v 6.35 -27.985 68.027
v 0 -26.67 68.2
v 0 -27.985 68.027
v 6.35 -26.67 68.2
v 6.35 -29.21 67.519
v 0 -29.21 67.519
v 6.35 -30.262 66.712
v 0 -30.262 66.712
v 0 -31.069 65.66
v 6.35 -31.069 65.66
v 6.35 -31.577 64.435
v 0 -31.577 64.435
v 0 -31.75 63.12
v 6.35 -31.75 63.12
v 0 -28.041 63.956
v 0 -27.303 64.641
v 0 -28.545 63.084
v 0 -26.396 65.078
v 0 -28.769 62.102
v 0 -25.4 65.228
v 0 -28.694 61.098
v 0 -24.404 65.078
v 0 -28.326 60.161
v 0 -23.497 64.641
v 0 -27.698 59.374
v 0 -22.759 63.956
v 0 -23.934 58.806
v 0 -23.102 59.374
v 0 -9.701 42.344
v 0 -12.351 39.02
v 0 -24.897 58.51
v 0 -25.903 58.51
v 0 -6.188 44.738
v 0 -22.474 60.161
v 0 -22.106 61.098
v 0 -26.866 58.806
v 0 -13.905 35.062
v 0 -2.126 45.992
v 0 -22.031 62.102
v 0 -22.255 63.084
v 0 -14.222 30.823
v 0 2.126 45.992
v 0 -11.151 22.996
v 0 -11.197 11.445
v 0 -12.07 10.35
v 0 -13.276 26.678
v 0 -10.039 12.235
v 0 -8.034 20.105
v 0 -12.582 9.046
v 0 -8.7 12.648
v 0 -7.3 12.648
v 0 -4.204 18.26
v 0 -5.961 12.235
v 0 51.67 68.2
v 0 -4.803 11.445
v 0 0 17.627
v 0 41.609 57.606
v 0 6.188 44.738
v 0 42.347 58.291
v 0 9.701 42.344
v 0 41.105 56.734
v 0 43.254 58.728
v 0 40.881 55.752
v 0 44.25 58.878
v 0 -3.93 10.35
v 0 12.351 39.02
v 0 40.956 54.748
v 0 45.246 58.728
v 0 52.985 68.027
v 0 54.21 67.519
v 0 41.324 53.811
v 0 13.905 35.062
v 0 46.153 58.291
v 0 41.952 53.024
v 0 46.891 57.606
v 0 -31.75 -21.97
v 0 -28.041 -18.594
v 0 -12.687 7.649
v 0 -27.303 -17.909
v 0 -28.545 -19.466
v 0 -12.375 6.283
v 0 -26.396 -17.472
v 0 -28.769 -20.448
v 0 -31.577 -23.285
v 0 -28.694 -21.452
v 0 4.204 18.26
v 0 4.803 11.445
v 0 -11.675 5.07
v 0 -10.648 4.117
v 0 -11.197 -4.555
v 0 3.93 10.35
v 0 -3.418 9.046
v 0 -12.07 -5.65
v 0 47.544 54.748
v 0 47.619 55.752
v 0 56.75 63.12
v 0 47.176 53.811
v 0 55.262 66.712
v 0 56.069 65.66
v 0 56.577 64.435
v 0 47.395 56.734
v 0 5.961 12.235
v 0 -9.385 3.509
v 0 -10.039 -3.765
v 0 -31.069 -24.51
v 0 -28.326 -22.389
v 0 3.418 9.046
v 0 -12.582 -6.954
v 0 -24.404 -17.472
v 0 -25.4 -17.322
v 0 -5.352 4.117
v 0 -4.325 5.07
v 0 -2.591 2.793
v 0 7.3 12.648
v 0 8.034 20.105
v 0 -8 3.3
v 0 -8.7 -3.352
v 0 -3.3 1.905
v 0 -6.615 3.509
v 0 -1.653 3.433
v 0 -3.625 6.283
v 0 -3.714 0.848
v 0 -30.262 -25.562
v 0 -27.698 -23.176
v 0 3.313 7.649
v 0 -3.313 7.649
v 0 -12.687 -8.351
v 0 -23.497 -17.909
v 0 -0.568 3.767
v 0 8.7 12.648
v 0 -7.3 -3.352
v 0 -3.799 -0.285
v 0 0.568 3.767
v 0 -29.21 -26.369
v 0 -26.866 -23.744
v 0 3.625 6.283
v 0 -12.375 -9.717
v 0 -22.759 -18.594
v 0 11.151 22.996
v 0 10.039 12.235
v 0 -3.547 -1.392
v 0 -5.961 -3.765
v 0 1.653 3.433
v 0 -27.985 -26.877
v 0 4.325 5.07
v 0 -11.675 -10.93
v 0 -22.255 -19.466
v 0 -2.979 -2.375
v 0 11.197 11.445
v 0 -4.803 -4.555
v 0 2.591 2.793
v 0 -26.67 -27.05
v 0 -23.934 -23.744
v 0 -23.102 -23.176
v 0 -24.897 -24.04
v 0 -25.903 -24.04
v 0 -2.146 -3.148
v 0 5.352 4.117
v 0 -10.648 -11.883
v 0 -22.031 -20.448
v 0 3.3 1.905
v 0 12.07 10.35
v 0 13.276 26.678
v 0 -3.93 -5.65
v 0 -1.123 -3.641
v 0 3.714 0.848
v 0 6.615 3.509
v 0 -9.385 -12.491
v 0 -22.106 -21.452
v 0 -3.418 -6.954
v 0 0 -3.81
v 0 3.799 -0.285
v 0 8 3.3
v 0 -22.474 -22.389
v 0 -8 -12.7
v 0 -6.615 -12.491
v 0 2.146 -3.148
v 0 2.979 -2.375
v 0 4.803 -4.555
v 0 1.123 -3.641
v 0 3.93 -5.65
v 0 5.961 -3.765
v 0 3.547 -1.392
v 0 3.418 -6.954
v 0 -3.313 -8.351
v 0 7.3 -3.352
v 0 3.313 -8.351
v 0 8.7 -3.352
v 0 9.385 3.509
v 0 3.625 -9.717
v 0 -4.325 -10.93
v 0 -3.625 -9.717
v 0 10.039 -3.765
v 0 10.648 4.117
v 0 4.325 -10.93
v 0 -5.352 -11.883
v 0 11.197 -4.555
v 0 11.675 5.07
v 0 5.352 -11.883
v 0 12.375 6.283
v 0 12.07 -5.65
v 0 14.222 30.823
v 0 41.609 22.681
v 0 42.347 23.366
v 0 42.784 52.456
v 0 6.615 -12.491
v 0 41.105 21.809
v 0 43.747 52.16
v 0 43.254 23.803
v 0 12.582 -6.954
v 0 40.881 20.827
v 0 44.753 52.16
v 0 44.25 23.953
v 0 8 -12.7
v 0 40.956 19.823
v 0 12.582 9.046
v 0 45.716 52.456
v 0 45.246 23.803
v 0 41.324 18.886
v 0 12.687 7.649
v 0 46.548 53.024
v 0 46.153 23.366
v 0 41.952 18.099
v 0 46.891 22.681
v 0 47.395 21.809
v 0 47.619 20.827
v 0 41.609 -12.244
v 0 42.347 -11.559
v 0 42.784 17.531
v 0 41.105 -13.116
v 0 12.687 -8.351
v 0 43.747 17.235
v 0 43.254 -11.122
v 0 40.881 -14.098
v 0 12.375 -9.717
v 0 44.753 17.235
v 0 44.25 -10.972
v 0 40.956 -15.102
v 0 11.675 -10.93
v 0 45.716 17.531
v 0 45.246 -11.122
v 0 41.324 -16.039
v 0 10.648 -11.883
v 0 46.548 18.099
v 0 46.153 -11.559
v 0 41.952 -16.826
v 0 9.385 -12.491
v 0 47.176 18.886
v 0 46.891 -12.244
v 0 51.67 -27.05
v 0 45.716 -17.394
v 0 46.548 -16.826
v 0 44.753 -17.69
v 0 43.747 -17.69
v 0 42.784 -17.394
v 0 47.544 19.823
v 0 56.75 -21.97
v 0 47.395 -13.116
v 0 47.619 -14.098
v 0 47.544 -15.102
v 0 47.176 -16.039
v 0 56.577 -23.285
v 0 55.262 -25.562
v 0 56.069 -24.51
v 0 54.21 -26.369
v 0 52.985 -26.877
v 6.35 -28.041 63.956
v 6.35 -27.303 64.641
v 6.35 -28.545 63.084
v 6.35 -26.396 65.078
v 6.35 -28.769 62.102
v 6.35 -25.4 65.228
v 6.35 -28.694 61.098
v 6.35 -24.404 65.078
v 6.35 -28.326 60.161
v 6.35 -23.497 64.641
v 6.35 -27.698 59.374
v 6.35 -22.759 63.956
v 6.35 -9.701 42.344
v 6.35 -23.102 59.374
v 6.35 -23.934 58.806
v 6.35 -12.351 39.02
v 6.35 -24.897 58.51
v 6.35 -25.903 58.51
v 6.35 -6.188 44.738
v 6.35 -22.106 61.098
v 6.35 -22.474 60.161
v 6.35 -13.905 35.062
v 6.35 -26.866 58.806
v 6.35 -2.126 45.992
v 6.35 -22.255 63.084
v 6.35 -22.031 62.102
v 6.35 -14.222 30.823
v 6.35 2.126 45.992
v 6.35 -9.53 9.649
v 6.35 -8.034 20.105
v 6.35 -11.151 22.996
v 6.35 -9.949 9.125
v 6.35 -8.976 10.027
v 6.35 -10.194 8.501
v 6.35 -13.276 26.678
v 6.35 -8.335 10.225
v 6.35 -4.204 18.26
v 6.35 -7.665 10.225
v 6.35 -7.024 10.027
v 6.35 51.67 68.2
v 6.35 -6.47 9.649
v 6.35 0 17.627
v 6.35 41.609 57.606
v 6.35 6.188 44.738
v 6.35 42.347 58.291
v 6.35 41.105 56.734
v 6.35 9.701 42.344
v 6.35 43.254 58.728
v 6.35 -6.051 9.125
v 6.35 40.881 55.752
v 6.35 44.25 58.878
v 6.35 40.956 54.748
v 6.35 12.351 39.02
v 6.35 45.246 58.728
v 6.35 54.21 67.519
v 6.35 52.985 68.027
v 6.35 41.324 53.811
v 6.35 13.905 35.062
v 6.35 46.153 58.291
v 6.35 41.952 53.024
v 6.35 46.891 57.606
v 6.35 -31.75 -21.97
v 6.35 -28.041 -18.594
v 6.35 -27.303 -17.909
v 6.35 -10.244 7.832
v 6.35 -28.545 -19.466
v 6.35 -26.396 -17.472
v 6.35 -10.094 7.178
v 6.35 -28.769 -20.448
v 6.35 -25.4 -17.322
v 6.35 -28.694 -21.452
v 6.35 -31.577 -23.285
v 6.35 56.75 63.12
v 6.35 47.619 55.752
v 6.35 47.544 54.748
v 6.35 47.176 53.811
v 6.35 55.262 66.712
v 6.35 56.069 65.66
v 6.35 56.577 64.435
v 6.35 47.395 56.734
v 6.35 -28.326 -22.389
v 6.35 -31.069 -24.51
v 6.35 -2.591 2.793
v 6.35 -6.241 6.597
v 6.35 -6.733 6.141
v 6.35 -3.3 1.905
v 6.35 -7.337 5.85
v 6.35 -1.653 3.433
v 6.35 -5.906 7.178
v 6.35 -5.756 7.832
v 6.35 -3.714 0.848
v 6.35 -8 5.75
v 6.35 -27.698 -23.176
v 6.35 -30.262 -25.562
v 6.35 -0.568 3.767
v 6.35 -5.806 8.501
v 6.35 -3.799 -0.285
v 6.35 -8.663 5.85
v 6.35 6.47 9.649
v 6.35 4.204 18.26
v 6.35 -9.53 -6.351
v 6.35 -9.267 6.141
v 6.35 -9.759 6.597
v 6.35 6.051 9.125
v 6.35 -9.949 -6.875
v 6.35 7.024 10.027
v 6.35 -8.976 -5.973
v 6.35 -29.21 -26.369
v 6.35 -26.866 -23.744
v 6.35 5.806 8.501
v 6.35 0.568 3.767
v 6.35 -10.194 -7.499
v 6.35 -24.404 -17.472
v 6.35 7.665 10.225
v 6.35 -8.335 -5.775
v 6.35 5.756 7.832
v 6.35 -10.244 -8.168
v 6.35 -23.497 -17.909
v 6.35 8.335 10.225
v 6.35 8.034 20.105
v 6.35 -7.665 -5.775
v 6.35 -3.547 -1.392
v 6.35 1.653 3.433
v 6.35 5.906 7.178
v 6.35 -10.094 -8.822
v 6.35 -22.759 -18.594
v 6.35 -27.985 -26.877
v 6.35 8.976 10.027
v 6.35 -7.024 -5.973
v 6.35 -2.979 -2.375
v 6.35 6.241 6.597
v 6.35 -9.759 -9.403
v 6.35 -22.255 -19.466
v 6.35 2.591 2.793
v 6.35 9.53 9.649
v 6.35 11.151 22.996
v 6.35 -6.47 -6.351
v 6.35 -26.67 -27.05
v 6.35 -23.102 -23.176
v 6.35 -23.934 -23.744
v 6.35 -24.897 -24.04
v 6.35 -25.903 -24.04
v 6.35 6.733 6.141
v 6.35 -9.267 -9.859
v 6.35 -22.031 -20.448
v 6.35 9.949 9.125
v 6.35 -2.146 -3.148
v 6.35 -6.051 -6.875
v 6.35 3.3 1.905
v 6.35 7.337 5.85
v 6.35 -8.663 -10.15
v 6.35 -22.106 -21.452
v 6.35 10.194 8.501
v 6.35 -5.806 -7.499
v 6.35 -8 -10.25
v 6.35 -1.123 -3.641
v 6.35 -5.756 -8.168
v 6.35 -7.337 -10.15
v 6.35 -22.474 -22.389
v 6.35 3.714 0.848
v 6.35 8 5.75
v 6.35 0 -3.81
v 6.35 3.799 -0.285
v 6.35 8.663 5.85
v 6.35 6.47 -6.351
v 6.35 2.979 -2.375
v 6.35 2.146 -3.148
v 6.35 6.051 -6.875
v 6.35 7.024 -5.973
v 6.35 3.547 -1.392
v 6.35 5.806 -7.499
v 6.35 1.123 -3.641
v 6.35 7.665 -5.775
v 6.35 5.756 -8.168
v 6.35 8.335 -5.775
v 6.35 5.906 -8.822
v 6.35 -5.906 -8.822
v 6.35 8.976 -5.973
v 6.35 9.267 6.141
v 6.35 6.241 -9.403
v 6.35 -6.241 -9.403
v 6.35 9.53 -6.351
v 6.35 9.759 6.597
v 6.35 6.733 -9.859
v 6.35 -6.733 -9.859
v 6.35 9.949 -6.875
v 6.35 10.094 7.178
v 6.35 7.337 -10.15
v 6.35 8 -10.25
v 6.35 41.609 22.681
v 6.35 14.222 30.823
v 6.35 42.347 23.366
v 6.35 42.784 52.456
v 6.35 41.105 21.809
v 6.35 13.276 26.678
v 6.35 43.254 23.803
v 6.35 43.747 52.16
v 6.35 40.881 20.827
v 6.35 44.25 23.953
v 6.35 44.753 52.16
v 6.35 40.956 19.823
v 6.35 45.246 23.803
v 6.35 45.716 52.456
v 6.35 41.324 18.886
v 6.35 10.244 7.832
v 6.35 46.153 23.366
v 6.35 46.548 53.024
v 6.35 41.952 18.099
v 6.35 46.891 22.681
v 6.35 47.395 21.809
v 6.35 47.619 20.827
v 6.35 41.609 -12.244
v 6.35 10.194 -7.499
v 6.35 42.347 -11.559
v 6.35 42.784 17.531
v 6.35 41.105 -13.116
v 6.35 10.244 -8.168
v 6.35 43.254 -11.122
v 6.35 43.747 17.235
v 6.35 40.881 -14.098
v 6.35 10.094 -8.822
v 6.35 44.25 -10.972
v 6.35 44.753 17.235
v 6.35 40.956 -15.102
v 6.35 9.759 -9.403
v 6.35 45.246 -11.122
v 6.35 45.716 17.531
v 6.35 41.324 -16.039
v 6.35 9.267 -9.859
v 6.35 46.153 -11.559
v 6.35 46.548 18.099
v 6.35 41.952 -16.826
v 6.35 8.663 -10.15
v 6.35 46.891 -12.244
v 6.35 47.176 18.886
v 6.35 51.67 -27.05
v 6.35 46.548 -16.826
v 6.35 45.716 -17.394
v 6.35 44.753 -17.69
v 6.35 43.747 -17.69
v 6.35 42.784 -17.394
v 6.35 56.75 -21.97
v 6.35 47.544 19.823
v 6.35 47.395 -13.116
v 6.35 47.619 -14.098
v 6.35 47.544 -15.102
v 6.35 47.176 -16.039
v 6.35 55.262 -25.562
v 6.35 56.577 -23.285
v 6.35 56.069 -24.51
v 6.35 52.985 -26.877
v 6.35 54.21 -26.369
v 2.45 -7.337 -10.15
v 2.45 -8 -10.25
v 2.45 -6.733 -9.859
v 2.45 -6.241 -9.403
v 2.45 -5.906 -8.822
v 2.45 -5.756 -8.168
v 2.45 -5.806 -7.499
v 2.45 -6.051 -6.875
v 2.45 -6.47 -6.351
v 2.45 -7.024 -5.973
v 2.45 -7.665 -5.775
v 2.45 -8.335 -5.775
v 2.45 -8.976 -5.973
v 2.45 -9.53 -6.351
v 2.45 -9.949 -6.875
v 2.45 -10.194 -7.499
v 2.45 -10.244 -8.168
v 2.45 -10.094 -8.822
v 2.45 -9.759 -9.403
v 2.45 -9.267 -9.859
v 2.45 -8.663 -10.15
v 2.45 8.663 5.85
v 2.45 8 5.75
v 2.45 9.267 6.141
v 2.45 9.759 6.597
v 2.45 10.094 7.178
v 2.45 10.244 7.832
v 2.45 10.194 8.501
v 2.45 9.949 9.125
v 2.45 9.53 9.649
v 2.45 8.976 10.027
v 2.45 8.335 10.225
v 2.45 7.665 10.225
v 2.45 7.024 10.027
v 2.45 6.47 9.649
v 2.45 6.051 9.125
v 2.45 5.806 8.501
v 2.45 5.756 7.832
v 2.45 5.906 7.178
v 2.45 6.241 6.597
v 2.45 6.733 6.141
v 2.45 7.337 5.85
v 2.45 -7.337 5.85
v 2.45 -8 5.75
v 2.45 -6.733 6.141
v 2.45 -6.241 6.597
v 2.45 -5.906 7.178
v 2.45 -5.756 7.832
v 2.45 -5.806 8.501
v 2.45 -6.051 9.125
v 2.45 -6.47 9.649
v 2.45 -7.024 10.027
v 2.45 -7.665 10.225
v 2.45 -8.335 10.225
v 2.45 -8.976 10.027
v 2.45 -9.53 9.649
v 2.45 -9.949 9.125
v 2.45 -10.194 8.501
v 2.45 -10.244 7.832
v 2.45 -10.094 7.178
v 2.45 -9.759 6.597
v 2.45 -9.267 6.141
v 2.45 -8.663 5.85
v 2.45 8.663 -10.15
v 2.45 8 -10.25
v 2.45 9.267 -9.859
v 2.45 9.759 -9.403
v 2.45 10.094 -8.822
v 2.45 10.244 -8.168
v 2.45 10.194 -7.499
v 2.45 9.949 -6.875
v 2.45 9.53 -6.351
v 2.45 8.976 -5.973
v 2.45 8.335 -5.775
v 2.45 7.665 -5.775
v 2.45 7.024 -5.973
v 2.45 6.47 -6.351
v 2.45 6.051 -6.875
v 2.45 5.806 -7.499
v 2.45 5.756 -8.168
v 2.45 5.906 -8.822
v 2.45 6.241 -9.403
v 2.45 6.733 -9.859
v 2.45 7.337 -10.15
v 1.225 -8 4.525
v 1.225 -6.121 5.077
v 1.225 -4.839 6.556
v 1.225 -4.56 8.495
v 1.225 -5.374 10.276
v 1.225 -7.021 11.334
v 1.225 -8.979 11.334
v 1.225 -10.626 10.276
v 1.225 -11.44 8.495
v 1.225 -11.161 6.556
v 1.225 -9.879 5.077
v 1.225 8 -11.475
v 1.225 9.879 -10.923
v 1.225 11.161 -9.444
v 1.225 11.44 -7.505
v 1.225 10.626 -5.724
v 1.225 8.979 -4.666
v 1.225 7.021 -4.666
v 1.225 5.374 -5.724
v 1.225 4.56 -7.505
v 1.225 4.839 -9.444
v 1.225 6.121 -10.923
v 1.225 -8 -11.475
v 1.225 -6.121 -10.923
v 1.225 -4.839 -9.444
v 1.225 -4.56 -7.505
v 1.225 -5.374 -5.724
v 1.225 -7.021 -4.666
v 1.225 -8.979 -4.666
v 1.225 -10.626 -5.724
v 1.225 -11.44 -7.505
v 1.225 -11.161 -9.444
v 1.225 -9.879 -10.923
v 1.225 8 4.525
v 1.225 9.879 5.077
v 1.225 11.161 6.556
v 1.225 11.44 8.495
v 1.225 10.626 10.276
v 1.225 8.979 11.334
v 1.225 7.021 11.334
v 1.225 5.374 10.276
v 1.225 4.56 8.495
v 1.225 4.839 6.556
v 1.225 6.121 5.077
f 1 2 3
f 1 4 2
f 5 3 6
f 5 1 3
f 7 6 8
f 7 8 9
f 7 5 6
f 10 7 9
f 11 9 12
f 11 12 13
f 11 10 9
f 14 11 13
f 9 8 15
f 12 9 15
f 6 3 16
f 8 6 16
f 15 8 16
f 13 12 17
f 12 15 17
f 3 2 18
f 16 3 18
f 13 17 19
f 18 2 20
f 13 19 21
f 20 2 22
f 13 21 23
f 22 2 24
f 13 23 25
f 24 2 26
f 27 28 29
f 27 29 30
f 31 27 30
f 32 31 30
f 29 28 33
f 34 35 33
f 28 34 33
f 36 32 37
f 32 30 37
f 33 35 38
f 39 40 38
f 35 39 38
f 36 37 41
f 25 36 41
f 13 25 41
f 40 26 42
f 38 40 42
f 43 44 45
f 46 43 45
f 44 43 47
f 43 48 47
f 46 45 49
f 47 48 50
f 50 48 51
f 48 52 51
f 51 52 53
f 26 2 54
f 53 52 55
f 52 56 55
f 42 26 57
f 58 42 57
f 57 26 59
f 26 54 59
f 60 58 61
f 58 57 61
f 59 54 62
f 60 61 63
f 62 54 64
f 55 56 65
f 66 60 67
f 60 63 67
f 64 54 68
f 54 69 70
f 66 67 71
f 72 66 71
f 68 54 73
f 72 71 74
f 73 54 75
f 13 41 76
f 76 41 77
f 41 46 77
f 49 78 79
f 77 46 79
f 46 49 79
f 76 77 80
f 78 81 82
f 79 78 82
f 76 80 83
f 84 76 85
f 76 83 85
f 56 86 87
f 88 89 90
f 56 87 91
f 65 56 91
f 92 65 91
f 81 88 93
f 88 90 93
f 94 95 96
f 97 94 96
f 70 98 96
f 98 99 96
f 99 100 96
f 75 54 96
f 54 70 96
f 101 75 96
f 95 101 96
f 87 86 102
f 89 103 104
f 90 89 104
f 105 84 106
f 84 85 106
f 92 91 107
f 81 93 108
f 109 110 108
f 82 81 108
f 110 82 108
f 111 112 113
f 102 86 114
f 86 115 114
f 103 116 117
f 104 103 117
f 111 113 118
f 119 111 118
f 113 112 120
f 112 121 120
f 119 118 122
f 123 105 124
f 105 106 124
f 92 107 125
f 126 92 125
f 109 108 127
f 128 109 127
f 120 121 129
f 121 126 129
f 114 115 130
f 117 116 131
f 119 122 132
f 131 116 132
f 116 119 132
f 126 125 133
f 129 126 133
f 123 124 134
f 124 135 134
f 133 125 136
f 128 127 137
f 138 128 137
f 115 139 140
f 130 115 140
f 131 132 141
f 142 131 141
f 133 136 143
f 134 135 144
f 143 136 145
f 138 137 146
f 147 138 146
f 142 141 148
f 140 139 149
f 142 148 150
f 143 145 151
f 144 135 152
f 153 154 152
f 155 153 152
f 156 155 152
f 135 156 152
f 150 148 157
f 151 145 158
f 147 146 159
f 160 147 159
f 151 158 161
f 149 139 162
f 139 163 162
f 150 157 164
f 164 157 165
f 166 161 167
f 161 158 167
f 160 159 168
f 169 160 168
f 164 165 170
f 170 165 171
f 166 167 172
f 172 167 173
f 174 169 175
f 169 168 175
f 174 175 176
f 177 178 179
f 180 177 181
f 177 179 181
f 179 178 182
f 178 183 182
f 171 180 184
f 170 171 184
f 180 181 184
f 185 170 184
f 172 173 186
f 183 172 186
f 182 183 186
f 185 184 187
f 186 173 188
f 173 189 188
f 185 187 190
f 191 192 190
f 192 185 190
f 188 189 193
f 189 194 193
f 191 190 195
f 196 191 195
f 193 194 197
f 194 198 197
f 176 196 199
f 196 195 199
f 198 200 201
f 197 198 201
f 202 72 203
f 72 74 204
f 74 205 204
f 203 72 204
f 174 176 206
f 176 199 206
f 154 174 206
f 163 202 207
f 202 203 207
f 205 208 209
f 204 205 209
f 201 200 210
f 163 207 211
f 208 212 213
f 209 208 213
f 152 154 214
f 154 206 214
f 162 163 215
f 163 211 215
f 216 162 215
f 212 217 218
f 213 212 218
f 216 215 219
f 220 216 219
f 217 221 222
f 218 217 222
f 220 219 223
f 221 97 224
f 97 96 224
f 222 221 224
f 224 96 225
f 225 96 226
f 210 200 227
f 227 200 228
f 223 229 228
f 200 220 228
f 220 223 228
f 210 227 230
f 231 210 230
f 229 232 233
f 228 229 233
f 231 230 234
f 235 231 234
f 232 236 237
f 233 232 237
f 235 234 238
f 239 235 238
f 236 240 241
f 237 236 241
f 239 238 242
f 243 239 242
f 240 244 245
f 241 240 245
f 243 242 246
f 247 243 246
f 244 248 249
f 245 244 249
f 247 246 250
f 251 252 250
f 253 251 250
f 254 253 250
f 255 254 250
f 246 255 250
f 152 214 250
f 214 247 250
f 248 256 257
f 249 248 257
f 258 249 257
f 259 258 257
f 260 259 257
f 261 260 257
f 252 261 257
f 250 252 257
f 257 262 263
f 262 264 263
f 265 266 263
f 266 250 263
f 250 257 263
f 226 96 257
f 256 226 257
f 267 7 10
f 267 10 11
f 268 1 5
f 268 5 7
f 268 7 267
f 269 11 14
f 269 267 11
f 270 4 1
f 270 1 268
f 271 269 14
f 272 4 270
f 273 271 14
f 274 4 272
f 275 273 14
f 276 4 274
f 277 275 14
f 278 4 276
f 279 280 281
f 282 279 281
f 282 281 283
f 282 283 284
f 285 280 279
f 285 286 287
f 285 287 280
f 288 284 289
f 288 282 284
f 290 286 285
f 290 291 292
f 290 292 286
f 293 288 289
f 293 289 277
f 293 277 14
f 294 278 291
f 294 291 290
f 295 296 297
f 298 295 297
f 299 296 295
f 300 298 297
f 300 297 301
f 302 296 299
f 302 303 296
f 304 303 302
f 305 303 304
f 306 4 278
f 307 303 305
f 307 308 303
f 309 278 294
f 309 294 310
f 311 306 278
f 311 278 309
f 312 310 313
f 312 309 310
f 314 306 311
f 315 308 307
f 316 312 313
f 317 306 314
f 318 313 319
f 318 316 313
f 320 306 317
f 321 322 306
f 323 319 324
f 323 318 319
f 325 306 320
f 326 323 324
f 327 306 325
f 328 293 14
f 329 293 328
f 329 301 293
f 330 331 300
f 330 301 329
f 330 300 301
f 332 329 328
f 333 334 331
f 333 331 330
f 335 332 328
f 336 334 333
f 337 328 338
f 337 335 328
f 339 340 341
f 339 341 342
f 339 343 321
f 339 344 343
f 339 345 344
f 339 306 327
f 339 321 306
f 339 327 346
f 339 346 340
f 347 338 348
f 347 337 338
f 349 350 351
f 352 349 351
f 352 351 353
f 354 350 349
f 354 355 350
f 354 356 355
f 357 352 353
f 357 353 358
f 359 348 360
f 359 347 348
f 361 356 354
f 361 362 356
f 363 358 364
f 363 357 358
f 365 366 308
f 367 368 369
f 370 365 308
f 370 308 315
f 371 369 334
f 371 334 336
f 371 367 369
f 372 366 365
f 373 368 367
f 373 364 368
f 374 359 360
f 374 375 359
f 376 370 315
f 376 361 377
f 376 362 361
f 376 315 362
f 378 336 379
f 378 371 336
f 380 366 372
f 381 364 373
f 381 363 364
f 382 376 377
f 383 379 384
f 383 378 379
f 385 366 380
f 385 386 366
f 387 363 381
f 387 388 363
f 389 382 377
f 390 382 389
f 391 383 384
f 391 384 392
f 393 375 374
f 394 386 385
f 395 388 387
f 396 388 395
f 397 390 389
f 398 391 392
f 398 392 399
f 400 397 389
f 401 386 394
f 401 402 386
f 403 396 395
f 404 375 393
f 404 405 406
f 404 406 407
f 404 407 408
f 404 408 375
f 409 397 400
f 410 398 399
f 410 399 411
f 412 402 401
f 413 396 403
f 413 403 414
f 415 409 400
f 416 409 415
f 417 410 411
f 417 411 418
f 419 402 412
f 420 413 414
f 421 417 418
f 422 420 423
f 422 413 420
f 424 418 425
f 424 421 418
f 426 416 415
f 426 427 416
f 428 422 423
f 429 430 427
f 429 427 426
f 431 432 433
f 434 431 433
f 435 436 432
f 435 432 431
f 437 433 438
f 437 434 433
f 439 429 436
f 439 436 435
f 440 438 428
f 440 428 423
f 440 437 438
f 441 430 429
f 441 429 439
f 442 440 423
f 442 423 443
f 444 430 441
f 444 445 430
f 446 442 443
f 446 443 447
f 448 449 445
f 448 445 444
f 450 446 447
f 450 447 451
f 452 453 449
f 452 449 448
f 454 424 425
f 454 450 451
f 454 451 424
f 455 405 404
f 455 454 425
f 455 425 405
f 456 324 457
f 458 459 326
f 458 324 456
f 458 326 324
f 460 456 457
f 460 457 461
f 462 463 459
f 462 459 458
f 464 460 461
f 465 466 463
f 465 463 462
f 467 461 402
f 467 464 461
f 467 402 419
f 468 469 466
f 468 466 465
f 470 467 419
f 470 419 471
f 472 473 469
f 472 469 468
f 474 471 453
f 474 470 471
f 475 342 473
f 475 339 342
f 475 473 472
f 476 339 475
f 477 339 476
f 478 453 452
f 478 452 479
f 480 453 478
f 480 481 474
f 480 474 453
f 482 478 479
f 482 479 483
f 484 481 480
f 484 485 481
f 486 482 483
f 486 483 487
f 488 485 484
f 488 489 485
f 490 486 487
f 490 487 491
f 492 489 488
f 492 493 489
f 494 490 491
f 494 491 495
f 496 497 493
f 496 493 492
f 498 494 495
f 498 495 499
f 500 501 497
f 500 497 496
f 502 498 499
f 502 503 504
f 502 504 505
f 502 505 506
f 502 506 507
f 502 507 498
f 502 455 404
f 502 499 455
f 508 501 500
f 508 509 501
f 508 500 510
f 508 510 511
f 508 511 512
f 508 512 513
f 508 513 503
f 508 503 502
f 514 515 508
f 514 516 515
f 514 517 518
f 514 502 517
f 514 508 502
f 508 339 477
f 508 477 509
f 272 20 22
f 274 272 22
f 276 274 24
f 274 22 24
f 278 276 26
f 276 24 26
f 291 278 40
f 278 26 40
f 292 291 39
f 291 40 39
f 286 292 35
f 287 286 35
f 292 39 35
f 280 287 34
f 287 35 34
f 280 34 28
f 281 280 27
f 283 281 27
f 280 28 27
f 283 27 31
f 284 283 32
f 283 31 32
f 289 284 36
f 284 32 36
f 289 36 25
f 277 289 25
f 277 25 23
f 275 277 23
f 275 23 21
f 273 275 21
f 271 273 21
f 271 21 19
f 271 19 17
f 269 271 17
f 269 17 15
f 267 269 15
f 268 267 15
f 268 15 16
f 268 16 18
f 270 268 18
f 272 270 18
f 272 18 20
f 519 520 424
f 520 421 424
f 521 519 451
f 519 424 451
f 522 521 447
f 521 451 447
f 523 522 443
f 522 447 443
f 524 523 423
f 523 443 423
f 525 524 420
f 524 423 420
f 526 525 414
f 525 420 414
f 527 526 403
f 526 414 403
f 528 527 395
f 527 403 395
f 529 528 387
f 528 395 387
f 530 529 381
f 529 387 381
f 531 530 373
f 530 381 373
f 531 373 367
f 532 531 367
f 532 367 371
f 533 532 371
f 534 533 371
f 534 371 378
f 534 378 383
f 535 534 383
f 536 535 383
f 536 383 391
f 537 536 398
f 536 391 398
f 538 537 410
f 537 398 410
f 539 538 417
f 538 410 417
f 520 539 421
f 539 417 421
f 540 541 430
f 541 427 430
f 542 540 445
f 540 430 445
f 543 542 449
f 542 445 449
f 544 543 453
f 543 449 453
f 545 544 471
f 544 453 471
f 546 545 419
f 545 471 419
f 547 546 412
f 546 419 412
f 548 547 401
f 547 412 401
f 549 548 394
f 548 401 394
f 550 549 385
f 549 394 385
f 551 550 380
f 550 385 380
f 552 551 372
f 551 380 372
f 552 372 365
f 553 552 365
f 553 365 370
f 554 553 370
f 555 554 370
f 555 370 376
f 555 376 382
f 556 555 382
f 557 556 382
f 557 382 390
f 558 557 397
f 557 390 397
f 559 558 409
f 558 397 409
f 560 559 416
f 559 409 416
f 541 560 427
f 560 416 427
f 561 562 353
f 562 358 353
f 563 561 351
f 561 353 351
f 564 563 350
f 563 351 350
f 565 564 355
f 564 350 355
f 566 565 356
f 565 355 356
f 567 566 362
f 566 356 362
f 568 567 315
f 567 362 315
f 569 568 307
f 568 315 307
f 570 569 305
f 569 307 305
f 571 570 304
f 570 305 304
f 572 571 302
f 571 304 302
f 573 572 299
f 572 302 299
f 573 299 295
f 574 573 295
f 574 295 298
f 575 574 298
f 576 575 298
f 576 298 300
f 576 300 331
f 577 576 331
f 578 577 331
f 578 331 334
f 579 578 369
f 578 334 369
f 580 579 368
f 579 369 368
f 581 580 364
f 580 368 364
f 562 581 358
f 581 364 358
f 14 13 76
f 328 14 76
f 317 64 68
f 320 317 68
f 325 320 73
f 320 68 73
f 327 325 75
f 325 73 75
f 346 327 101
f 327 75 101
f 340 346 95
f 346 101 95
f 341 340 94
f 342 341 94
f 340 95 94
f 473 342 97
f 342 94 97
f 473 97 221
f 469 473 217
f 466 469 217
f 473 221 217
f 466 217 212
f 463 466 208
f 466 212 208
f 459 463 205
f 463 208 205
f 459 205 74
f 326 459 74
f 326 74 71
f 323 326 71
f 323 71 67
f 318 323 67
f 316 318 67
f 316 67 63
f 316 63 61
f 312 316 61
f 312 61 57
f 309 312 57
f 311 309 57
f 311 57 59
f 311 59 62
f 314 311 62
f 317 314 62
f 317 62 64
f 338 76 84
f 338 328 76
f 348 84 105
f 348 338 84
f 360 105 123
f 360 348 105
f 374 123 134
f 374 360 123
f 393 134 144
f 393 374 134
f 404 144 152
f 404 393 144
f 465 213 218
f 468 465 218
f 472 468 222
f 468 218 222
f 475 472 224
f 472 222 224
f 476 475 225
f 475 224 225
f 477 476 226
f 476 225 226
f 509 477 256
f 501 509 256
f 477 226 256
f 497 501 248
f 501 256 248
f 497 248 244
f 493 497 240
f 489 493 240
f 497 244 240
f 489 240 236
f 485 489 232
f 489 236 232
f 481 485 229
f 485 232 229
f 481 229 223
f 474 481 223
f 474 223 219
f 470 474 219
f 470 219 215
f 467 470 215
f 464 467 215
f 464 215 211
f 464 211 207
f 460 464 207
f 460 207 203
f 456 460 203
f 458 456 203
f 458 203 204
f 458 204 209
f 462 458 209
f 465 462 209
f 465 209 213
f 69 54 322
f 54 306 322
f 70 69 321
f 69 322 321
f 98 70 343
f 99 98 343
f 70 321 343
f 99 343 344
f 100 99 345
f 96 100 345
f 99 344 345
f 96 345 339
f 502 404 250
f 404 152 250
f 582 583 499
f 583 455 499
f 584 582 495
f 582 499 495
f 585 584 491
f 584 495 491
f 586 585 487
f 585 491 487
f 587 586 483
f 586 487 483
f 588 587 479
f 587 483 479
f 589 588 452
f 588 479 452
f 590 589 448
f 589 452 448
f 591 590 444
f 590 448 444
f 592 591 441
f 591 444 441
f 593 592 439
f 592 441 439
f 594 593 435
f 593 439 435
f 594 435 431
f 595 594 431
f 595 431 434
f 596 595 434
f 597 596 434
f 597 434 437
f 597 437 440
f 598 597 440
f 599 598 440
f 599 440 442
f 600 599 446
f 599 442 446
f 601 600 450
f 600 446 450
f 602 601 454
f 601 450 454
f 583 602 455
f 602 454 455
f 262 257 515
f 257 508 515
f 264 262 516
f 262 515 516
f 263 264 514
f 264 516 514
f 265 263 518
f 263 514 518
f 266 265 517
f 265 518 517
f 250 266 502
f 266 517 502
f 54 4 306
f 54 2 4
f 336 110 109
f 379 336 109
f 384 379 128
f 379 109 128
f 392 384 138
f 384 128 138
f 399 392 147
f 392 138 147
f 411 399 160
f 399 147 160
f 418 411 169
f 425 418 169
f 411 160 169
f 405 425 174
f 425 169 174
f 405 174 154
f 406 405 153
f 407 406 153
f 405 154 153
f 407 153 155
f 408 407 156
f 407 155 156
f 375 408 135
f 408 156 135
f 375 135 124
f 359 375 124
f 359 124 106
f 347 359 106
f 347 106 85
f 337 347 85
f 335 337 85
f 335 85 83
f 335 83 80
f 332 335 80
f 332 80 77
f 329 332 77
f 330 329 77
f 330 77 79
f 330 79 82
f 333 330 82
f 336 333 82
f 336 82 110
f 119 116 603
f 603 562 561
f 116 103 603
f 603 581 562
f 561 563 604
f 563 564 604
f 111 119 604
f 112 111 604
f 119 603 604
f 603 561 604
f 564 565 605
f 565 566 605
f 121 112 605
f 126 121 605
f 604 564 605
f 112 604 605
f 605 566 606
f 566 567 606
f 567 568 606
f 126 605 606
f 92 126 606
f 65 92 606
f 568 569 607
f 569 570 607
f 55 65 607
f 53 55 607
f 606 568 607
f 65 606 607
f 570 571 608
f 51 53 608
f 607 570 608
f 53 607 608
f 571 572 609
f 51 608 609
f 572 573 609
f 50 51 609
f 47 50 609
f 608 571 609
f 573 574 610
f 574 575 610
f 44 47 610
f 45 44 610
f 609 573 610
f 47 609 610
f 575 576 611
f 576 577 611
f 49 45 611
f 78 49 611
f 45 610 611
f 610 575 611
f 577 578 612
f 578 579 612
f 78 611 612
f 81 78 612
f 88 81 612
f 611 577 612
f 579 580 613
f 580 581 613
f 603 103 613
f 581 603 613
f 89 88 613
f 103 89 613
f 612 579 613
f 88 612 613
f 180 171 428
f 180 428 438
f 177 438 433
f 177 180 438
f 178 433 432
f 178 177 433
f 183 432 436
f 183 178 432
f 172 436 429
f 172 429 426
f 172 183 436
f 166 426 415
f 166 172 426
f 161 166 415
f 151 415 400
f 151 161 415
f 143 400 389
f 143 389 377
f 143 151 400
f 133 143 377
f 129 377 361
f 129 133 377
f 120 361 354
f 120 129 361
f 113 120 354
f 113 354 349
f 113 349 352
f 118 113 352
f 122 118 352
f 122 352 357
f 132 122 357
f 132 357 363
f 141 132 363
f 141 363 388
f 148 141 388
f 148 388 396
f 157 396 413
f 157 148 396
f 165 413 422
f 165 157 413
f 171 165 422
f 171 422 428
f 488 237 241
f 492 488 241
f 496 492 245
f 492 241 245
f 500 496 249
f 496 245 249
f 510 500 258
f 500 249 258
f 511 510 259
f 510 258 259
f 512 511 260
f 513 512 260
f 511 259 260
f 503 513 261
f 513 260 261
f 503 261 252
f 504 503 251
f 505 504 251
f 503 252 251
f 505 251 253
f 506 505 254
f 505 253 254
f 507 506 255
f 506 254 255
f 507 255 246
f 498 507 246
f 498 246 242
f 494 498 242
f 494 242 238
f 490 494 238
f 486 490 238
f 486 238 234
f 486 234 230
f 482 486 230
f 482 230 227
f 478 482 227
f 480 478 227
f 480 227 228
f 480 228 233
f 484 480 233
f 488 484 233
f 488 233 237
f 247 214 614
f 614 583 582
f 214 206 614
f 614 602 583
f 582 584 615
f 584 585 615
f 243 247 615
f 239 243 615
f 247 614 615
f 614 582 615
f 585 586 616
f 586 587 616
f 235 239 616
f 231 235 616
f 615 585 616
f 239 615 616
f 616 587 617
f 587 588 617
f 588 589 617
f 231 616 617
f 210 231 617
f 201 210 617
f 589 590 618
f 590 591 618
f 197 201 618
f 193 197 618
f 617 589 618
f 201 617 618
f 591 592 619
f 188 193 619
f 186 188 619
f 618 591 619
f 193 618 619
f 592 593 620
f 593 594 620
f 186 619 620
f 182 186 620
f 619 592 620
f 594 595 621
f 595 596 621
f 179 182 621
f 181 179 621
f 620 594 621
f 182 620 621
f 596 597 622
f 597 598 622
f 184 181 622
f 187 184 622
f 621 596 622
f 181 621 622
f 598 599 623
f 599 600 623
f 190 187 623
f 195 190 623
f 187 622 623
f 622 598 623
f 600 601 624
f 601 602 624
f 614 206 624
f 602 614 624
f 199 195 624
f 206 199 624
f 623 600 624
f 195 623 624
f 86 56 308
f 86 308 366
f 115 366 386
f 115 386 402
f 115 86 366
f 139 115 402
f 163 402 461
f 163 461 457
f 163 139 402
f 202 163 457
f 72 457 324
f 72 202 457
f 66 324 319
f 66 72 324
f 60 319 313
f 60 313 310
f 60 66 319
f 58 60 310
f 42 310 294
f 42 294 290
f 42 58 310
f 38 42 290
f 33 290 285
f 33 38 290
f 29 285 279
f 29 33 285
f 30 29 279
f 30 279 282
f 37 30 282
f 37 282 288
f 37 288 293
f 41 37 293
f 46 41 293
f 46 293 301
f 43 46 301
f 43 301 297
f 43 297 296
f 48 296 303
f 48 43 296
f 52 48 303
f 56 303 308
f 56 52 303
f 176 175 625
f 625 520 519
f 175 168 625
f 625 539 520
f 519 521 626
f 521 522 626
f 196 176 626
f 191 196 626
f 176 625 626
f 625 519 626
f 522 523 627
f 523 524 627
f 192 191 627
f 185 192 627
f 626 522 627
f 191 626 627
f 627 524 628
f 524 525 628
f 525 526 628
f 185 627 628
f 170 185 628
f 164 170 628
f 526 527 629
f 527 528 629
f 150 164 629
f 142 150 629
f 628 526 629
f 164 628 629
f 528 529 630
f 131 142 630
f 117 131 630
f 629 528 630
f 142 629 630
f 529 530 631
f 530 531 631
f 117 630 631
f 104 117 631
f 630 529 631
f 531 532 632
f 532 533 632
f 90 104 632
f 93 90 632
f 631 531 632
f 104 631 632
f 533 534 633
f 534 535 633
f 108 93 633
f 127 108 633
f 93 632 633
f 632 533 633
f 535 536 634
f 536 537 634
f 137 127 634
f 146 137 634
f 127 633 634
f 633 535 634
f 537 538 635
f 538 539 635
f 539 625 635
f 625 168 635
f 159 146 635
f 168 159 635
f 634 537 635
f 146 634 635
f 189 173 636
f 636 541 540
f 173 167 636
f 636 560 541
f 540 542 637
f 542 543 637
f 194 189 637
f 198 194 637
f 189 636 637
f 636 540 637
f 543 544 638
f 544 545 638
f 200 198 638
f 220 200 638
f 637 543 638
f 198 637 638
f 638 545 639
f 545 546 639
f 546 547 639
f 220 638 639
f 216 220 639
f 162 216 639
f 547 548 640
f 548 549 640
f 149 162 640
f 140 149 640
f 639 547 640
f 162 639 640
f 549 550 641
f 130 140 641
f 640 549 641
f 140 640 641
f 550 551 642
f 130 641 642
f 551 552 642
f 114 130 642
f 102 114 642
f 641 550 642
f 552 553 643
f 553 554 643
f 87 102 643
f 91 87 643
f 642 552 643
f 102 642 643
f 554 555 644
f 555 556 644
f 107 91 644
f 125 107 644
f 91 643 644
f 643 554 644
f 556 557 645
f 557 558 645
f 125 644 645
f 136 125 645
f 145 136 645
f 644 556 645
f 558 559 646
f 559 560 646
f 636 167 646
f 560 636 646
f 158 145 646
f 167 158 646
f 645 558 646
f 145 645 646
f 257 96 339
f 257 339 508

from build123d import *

# Parameters (mm, degrees)
SKETCH1_W                                       = 95.25
SKETCH1_H                                       = 25
SKETCH1_H_2                                     = 63.5
SKETCH1_R                                       = 14.2621
SKETCH1_R_2                                     = 3.81
BOSS_EXTRUDE1_DEPTH                             = 6.35
F_1_4_CLEARANCE_HOLE2_D                         = 6.7564
FILLET1_R                                       = 5.08
CSK_FOR_M4_FLAT_HEAD_MACHINE_SCREW2_D           = 4.5
CSK_FOR_M4_FLAT_HEAD_MACHINE_SCREW2_CSINK_D     = 9.4
CSK_FOR_M4_FLAT_HEAD_MACHINE_SCREW2_CSINK_ANGLE = 90


with BuildPart() as part:
    # Sketch1 → Boss-Extrude1 (new body)
    # profile 1 of 2: a face of its own
    with BuildSketch(Plane(origin=(0, 0, 0), x_dir=(0, 0, -1), z_dir=(1, 0, 0))):
        with Locations((-20.575, 44.25)):
            Rectangle(SKETCH1_W, SKETCH1_H)
    # profile 2 of 2: a face of its own
    with BuildSketch(Plane(origin=(0, 0, 0), x_dir=(0, 0, -1), z_dir=(1, 0, 0))):
        with Locations((-20.575, 0)):
            Rectangle(SKETCH1_W, SKETCH1_H_2)
        with Locations((-31.8887, 0)):
            Circle(SKETCH1_R, mode=Mode.SUBTRACT)
        Circle(SKETCH1_R_2, mode=Mode.SUBTRACT)
    extrude(amount=BOSS_EXTRUDE1_DEPTH)

    # 1/4 Clearance Hole2 (through all)
    with Locations(Plane(origin=(6.35, 0, 0), x_dir=(0, 0, -1), z_dir=(1, 0, 0))):
        with Locations((-55.5, 44.25), (-20.575, 44.25), (14.35, 44.25), (-61.85, -25.4), (20.7, -25.4)):
            Hole(F_1_4_CLEARANCE_HOLE2_D / 2)

    # Fillet1
    fillet1_edges = [part.edges().sort_by_distance(p)[0] for p in [
        (3.175, -31.75, -27.05),
        (3.175, -31.75, 68.2),
        (3.175, 56.75, 68.2),
        (3.175, 56.75, -27.05),
    ]]
    fillet(fillet1_edges, radius=FILLET1_R)

    # CSK for M4 Flat Head Machine Screw2 (through all)
    with Locations(Plane.ZY):
        with Locations((-8, 8), (8, 8), (8, -8), (-8, -8)):
            CounterSinkHole(CSK_FOR_M4_FLAT_HEAD_MACHINE_SCREW2_D / 2, CSK_FOR_M4_FLAT_HEAD_MACHINE_SCREW2_CSINK_D / 2, counter_sink_angle=CSK_FOR_M4_FLAT_HEAD_MACHINE_SCREW2_CSINK_ANGLE)


solid = part.part
